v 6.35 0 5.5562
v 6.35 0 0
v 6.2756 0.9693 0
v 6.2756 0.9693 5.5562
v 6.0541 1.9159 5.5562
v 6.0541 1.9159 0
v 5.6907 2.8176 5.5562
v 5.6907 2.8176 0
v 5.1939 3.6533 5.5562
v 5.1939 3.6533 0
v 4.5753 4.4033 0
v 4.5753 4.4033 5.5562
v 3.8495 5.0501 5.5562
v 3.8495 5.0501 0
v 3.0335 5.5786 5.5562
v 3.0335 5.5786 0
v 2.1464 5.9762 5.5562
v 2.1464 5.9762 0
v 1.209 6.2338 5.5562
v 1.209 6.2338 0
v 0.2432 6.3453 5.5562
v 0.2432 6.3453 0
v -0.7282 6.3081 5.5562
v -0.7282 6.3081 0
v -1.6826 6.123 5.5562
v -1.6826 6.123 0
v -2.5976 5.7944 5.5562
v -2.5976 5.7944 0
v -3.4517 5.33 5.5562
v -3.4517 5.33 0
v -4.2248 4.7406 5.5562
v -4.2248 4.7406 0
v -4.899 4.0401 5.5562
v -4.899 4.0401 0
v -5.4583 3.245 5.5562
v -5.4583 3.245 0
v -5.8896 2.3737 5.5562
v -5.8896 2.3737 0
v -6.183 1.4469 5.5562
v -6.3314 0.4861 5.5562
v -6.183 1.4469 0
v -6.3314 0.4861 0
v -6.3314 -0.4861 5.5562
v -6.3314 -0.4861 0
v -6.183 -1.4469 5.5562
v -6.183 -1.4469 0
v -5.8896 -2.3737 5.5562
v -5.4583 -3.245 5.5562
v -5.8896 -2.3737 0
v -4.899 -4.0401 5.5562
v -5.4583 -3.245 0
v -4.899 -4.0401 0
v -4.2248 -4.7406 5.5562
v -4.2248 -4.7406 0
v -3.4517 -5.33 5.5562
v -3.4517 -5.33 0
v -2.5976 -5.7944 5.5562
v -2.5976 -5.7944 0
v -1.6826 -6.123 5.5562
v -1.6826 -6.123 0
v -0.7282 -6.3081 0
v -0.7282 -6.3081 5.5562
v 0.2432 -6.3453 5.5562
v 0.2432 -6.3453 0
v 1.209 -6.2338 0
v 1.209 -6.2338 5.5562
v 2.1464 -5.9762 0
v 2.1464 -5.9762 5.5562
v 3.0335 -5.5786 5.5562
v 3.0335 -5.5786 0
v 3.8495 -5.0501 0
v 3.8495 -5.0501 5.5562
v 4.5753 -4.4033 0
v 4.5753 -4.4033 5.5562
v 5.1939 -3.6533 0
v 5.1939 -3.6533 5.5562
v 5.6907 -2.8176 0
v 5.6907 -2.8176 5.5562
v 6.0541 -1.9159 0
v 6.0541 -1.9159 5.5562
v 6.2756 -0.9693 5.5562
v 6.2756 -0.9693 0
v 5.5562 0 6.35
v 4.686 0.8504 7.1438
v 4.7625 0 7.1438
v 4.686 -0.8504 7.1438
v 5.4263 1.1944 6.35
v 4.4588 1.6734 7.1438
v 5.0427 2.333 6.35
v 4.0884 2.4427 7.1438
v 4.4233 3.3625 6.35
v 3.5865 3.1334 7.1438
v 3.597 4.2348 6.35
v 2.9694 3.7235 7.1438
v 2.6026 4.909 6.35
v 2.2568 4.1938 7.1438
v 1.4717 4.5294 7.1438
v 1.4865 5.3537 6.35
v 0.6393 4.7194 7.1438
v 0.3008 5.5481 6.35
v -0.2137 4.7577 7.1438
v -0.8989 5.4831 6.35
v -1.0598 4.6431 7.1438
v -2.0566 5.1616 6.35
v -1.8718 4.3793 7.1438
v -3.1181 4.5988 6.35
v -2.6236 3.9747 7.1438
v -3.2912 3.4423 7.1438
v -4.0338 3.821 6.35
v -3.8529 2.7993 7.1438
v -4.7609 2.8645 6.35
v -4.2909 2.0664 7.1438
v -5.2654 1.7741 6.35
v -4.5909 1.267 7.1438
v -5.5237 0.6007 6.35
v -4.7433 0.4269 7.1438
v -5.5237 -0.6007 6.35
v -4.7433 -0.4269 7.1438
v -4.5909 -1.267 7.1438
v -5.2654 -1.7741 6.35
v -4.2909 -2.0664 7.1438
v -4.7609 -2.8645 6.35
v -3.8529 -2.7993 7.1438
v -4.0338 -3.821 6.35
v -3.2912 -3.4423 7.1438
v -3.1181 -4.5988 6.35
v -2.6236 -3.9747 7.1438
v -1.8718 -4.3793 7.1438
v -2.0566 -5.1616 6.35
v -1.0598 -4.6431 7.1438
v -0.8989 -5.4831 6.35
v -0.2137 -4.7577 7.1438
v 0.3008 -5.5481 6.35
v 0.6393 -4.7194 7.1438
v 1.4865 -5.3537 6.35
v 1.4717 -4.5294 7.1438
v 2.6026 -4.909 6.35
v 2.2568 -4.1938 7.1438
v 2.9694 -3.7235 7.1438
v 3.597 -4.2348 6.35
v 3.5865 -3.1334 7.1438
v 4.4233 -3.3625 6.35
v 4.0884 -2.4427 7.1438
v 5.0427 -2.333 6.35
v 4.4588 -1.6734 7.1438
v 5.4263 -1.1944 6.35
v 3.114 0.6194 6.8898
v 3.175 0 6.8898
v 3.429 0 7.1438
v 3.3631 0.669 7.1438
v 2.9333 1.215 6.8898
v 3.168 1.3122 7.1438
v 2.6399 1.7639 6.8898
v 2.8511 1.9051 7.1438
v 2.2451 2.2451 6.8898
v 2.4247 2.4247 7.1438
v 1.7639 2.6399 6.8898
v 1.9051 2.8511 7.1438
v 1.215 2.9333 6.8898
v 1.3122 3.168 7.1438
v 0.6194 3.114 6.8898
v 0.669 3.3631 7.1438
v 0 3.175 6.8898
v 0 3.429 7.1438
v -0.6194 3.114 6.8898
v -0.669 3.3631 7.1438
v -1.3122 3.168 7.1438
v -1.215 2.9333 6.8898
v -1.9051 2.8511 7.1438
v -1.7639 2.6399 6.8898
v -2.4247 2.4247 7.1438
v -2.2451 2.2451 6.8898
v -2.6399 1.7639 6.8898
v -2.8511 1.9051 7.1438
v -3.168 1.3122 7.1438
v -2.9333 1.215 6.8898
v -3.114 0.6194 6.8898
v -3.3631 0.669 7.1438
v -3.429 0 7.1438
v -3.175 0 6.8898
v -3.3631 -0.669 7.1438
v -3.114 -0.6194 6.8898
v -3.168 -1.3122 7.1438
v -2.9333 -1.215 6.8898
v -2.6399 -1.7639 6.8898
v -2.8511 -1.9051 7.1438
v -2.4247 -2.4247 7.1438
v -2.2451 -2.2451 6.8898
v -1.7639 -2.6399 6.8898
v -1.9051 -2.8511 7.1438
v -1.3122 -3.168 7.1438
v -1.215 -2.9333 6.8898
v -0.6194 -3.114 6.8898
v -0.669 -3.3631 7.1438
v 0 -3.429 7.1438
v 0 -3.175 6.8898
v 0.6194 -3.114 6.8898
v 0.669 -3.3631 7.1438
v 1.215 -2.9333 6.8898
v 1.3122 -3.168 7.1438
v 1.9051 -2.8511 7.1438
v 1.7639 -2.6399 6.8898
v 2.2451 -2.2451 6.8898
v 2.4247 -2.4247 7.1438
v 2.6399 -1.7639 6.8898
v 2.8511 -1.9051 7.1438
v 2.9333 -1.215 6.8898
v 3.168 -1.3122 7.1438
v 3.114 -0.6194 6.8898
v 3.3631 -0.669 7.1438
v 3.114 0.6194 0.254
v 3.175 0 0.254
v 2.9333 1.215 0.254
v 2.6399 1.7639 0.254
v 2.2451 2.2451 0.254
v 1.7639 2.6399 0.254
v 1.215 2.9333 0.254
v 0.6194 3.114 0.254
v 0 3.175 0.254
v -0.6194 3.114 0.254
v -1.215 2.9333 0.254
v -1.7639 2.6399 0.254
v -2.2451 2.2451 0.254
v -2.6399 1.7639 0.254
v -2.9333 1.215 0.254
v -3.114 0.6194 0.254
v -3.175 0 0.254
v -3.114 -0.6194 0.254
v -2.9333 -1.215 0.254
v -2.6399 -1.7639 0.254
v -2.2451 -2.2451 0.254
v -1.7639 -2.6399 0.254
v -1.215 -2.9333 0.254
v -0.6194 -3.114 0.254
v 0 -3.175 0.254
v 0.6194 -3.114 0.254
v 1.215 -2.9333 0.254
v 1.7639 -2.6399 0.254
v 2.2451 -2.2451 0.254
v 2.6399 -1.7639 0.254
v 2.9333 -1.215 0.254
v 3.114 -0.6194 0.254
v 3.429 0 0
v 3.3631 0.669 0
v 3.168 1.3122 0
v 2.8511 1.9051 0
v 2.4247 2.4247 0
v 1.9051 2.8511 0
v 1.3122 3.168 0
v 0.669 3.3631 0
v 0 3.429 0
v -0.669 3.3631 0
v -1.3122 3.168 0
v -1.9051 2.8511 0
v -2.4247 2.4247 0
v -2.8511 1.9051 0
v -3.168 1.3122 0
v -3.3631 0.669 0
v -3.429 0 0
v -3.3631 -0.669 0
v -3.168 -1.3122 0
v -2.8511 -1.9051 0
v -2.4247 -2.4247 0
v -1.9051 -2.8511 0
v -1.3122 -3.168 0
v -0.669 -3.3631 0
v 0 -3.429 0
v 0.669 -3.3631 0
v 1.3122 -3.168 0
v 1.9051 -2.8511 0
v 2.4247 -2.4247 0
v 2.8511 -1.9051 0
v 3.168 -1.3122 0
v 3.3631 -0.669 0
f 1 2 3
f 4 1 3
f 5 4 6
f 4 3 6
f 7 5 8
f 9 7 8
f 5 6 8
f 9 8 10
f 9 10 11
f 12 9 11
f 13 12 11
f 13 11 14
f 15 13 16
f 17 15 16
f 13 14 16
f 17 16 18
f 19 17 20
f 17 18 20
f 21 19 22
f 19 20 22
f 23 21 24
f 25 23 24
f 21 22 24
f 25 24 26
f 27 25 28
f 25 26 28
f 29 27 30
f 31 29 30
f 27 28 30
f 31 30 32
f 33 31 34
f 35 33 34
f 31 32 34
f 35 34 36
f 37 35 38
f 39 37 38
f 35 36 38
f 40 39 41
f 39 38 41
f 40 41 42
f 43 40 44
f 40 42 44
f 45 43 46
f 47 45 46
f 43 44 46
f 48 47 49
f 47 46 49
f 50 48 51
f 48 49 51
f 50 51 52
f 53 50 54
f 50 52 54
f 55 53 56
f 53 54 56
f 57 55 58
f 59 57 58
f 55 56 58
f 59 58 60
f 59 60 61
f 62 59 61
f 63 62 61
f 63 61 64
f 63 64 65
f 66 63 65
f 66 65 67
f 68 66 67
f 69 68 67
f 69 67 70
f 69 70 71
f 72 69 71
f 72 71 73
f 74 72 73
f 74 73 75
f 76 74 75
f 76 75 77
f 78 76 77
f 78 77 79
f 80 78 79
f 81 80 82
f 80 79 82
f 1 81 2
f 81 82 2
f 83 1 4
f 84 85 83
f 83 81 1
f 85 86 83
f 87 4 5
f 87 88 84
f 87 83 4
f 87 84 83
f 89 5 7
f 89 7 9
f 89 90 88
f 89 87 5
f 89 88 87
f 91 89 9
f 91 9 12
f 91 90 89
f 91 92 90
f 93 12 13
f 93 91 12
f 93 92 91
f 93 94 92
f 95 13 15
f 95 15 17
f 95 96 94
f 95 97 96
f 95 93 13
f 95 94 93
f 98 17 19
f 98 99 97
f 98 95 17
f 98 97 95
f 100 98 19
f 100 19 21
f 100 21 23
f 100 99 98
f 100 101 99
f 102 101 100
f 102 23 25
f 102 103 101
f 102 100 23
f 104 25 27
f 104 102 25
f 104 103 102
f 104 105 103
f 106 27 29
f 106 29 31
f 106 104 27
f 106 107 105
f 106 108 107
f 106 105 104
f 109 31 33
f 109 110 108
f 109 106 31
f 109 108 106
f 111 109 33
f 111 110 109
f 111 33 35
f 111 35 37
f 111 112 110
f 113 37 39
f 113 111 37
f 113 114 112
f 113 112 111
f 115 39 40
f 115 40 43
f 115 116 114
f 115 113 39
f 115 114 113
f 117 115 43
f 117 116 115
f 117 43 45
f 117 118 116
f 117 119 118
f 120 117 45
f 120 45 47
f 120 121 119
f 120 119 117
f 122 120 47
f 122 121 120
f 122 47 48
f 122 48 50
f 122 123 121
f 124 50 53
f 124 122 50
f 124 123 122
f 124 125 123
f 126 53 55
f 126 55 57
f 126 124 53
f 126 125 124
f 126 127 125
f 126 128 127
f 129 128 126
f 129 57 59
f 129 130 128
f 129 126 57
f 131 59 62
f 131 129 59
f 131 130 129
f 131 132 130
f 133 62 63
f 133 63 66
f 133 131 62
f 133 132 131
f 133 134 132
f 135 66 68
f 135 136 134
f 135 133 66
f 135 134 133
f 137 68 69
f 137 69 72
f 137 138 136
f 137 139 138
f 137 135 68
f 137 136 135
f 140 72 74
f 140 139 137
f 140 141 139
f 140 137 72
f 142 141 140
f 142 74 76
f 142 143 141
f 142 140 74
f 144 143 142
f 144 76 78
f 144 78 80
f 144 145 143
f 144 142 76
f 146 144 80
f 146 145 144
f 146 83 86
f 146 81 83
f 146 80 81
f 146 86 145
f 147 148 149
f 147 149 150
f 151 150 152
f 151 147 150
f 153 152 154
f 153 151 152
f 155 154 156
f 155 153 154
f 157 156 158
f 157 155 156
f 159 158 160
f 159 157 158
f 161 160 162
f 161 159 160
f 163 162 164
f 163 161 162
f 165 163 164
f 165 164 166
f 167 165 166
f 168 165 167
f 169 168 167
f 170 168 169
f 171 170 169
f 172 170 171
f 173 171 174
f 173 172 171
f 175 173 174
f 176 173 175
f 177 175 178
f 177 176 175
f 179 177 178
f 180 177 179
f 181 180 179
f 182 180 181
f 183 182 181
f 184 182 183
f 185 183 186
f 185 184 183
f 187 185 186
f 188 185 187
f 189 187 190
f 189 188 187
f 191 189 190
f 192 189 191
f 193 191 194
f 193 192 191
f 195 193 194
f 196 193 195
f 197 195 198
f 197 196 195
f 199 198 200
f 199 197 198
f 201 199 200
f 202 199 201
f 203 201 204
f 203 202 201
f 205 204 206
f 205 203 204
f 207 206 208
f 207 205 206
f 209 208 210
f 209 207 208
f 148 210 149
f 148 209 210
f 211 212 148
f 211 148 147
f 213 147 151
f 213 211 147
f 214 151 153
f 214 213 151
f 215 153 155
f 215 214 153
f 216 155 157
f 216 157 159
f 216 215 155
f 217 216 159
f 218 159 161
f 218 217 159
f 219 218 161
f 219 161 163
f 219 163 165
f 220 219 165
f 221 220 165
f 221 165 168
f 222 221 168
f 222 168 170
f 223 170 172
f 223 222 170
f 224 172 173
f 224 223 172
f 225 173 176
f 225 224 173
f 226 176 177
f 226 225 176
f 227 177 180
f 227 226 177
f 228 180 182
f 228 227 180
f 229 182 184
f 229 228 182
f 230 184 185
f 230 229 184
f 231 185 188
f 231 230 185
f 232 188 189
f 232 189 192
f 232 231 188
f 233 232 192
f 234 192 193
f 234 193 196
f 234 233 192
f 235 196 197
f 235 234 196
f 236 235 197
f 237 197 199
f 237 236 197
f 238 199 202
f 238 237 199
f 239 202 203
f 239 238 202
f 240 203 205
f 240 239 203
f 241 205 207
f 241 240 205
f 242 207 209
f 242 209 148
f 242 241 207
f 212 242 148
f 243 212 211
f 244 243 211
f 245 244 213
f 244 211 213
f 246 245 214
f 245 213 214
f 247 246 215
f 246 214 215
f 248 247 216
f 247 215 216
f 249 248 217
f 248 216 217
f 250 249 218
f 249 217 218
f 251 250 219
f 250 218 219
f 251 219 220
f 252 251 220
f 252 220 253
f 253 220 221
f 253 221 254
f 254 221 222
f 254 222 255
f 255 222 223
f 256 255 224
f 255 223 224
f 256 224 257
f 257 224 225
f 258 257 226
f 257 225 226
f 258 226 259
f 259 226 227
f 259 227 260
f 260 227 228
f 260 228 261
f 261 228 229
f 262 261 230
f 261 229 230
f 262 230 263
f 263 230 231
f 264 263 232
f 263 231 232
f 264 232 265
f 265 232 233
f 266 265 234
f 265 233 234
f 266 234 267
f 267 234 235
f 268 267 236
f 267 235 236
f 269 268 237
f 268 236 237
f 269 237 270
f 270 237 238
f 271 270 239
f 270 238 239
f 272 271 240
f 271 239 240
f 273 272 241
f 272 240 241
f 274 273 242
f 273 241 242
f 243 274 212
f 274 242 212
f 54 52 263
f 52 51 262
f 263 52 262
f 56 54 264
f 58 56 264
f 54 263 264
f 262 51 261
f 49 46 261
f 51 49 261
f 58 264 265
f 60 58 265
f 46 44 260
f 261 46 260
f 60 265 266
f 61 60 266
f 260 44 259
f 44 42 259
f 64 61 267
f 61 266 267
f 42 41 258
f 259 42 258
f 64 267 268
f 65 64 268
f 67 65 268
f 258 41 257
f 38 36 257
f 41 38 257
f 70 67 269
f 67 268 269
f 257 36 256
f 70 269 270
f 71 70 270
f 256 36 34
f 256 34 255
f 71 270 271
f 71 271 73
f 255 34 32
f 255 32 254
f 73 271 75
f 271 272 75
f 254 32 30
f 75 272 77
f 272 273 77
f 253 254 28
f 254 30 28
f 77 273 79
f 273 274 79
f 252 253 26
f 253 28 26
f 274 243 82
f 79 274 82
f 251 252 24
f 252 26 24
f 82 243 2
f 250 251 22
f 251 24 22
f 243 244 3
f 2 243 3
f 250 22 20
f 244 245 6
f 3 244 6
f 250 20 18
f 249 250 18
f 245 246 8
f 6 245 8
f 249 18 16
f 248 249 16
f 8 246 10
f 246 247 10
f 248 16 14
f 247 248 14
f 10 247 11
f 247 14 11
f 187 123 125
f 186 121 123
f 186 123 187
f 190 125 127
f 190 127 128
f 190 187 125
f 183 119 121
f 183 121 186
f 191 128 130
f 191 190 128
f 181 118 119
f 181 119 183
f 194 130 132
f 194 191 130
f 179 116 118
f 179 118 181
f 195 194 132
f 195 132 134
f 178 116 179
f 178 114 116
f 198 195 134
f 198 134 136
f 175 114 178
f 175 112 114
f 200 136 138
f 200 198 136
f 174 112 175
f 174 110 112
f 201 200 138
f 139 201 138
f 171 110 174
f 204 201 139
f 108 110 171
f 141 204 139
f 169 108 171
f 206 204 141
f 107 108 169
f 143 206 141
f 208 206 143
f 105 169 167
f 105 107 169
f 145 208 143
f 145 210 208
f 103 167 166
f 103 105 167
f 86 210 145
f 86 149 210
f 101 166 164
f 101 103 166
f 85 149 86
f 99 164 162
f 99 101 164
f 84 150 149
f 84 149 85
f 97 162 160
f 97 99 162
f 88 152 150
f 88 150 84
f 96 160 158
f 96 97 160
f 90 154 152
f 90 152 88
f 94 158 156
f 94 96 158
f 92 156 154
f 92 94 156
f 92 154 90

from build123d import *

# Parameters (mm, degrees)
F0_R     = 6.35
F0_R_2   = 3.175
F1_DEPTH = 7.14375
F2_SIZE  = 1.5875
F3_SIZE  = 0.254


with BuildPart() as f1:
    # F0 (on Top) → F1 (new body)
    with BuildSketch(Plane.XY):
        Circle(F0_R)
        Circle(F0_R_2, mode=Mode.SUBTRACT)
    extrude(amount=F1_DEPTH)

    # F2
    f2_edges = [f1.edges().sort_by_distance(p)[0] for p in [
        (-6.35, 0, 7.14375),
    ]]
    chamfer(f2_edges, length=F2_SIZE)

    # F3
    f3_edges = [f1.edges().sort_by_distance(p)[0] for p in [
        (-3.175, 0, 7.14375),
        (-3.175, 0, 0),
    ]]
    chamfer(f3_edges, length=F3_SIZE)


solid = f1.part
